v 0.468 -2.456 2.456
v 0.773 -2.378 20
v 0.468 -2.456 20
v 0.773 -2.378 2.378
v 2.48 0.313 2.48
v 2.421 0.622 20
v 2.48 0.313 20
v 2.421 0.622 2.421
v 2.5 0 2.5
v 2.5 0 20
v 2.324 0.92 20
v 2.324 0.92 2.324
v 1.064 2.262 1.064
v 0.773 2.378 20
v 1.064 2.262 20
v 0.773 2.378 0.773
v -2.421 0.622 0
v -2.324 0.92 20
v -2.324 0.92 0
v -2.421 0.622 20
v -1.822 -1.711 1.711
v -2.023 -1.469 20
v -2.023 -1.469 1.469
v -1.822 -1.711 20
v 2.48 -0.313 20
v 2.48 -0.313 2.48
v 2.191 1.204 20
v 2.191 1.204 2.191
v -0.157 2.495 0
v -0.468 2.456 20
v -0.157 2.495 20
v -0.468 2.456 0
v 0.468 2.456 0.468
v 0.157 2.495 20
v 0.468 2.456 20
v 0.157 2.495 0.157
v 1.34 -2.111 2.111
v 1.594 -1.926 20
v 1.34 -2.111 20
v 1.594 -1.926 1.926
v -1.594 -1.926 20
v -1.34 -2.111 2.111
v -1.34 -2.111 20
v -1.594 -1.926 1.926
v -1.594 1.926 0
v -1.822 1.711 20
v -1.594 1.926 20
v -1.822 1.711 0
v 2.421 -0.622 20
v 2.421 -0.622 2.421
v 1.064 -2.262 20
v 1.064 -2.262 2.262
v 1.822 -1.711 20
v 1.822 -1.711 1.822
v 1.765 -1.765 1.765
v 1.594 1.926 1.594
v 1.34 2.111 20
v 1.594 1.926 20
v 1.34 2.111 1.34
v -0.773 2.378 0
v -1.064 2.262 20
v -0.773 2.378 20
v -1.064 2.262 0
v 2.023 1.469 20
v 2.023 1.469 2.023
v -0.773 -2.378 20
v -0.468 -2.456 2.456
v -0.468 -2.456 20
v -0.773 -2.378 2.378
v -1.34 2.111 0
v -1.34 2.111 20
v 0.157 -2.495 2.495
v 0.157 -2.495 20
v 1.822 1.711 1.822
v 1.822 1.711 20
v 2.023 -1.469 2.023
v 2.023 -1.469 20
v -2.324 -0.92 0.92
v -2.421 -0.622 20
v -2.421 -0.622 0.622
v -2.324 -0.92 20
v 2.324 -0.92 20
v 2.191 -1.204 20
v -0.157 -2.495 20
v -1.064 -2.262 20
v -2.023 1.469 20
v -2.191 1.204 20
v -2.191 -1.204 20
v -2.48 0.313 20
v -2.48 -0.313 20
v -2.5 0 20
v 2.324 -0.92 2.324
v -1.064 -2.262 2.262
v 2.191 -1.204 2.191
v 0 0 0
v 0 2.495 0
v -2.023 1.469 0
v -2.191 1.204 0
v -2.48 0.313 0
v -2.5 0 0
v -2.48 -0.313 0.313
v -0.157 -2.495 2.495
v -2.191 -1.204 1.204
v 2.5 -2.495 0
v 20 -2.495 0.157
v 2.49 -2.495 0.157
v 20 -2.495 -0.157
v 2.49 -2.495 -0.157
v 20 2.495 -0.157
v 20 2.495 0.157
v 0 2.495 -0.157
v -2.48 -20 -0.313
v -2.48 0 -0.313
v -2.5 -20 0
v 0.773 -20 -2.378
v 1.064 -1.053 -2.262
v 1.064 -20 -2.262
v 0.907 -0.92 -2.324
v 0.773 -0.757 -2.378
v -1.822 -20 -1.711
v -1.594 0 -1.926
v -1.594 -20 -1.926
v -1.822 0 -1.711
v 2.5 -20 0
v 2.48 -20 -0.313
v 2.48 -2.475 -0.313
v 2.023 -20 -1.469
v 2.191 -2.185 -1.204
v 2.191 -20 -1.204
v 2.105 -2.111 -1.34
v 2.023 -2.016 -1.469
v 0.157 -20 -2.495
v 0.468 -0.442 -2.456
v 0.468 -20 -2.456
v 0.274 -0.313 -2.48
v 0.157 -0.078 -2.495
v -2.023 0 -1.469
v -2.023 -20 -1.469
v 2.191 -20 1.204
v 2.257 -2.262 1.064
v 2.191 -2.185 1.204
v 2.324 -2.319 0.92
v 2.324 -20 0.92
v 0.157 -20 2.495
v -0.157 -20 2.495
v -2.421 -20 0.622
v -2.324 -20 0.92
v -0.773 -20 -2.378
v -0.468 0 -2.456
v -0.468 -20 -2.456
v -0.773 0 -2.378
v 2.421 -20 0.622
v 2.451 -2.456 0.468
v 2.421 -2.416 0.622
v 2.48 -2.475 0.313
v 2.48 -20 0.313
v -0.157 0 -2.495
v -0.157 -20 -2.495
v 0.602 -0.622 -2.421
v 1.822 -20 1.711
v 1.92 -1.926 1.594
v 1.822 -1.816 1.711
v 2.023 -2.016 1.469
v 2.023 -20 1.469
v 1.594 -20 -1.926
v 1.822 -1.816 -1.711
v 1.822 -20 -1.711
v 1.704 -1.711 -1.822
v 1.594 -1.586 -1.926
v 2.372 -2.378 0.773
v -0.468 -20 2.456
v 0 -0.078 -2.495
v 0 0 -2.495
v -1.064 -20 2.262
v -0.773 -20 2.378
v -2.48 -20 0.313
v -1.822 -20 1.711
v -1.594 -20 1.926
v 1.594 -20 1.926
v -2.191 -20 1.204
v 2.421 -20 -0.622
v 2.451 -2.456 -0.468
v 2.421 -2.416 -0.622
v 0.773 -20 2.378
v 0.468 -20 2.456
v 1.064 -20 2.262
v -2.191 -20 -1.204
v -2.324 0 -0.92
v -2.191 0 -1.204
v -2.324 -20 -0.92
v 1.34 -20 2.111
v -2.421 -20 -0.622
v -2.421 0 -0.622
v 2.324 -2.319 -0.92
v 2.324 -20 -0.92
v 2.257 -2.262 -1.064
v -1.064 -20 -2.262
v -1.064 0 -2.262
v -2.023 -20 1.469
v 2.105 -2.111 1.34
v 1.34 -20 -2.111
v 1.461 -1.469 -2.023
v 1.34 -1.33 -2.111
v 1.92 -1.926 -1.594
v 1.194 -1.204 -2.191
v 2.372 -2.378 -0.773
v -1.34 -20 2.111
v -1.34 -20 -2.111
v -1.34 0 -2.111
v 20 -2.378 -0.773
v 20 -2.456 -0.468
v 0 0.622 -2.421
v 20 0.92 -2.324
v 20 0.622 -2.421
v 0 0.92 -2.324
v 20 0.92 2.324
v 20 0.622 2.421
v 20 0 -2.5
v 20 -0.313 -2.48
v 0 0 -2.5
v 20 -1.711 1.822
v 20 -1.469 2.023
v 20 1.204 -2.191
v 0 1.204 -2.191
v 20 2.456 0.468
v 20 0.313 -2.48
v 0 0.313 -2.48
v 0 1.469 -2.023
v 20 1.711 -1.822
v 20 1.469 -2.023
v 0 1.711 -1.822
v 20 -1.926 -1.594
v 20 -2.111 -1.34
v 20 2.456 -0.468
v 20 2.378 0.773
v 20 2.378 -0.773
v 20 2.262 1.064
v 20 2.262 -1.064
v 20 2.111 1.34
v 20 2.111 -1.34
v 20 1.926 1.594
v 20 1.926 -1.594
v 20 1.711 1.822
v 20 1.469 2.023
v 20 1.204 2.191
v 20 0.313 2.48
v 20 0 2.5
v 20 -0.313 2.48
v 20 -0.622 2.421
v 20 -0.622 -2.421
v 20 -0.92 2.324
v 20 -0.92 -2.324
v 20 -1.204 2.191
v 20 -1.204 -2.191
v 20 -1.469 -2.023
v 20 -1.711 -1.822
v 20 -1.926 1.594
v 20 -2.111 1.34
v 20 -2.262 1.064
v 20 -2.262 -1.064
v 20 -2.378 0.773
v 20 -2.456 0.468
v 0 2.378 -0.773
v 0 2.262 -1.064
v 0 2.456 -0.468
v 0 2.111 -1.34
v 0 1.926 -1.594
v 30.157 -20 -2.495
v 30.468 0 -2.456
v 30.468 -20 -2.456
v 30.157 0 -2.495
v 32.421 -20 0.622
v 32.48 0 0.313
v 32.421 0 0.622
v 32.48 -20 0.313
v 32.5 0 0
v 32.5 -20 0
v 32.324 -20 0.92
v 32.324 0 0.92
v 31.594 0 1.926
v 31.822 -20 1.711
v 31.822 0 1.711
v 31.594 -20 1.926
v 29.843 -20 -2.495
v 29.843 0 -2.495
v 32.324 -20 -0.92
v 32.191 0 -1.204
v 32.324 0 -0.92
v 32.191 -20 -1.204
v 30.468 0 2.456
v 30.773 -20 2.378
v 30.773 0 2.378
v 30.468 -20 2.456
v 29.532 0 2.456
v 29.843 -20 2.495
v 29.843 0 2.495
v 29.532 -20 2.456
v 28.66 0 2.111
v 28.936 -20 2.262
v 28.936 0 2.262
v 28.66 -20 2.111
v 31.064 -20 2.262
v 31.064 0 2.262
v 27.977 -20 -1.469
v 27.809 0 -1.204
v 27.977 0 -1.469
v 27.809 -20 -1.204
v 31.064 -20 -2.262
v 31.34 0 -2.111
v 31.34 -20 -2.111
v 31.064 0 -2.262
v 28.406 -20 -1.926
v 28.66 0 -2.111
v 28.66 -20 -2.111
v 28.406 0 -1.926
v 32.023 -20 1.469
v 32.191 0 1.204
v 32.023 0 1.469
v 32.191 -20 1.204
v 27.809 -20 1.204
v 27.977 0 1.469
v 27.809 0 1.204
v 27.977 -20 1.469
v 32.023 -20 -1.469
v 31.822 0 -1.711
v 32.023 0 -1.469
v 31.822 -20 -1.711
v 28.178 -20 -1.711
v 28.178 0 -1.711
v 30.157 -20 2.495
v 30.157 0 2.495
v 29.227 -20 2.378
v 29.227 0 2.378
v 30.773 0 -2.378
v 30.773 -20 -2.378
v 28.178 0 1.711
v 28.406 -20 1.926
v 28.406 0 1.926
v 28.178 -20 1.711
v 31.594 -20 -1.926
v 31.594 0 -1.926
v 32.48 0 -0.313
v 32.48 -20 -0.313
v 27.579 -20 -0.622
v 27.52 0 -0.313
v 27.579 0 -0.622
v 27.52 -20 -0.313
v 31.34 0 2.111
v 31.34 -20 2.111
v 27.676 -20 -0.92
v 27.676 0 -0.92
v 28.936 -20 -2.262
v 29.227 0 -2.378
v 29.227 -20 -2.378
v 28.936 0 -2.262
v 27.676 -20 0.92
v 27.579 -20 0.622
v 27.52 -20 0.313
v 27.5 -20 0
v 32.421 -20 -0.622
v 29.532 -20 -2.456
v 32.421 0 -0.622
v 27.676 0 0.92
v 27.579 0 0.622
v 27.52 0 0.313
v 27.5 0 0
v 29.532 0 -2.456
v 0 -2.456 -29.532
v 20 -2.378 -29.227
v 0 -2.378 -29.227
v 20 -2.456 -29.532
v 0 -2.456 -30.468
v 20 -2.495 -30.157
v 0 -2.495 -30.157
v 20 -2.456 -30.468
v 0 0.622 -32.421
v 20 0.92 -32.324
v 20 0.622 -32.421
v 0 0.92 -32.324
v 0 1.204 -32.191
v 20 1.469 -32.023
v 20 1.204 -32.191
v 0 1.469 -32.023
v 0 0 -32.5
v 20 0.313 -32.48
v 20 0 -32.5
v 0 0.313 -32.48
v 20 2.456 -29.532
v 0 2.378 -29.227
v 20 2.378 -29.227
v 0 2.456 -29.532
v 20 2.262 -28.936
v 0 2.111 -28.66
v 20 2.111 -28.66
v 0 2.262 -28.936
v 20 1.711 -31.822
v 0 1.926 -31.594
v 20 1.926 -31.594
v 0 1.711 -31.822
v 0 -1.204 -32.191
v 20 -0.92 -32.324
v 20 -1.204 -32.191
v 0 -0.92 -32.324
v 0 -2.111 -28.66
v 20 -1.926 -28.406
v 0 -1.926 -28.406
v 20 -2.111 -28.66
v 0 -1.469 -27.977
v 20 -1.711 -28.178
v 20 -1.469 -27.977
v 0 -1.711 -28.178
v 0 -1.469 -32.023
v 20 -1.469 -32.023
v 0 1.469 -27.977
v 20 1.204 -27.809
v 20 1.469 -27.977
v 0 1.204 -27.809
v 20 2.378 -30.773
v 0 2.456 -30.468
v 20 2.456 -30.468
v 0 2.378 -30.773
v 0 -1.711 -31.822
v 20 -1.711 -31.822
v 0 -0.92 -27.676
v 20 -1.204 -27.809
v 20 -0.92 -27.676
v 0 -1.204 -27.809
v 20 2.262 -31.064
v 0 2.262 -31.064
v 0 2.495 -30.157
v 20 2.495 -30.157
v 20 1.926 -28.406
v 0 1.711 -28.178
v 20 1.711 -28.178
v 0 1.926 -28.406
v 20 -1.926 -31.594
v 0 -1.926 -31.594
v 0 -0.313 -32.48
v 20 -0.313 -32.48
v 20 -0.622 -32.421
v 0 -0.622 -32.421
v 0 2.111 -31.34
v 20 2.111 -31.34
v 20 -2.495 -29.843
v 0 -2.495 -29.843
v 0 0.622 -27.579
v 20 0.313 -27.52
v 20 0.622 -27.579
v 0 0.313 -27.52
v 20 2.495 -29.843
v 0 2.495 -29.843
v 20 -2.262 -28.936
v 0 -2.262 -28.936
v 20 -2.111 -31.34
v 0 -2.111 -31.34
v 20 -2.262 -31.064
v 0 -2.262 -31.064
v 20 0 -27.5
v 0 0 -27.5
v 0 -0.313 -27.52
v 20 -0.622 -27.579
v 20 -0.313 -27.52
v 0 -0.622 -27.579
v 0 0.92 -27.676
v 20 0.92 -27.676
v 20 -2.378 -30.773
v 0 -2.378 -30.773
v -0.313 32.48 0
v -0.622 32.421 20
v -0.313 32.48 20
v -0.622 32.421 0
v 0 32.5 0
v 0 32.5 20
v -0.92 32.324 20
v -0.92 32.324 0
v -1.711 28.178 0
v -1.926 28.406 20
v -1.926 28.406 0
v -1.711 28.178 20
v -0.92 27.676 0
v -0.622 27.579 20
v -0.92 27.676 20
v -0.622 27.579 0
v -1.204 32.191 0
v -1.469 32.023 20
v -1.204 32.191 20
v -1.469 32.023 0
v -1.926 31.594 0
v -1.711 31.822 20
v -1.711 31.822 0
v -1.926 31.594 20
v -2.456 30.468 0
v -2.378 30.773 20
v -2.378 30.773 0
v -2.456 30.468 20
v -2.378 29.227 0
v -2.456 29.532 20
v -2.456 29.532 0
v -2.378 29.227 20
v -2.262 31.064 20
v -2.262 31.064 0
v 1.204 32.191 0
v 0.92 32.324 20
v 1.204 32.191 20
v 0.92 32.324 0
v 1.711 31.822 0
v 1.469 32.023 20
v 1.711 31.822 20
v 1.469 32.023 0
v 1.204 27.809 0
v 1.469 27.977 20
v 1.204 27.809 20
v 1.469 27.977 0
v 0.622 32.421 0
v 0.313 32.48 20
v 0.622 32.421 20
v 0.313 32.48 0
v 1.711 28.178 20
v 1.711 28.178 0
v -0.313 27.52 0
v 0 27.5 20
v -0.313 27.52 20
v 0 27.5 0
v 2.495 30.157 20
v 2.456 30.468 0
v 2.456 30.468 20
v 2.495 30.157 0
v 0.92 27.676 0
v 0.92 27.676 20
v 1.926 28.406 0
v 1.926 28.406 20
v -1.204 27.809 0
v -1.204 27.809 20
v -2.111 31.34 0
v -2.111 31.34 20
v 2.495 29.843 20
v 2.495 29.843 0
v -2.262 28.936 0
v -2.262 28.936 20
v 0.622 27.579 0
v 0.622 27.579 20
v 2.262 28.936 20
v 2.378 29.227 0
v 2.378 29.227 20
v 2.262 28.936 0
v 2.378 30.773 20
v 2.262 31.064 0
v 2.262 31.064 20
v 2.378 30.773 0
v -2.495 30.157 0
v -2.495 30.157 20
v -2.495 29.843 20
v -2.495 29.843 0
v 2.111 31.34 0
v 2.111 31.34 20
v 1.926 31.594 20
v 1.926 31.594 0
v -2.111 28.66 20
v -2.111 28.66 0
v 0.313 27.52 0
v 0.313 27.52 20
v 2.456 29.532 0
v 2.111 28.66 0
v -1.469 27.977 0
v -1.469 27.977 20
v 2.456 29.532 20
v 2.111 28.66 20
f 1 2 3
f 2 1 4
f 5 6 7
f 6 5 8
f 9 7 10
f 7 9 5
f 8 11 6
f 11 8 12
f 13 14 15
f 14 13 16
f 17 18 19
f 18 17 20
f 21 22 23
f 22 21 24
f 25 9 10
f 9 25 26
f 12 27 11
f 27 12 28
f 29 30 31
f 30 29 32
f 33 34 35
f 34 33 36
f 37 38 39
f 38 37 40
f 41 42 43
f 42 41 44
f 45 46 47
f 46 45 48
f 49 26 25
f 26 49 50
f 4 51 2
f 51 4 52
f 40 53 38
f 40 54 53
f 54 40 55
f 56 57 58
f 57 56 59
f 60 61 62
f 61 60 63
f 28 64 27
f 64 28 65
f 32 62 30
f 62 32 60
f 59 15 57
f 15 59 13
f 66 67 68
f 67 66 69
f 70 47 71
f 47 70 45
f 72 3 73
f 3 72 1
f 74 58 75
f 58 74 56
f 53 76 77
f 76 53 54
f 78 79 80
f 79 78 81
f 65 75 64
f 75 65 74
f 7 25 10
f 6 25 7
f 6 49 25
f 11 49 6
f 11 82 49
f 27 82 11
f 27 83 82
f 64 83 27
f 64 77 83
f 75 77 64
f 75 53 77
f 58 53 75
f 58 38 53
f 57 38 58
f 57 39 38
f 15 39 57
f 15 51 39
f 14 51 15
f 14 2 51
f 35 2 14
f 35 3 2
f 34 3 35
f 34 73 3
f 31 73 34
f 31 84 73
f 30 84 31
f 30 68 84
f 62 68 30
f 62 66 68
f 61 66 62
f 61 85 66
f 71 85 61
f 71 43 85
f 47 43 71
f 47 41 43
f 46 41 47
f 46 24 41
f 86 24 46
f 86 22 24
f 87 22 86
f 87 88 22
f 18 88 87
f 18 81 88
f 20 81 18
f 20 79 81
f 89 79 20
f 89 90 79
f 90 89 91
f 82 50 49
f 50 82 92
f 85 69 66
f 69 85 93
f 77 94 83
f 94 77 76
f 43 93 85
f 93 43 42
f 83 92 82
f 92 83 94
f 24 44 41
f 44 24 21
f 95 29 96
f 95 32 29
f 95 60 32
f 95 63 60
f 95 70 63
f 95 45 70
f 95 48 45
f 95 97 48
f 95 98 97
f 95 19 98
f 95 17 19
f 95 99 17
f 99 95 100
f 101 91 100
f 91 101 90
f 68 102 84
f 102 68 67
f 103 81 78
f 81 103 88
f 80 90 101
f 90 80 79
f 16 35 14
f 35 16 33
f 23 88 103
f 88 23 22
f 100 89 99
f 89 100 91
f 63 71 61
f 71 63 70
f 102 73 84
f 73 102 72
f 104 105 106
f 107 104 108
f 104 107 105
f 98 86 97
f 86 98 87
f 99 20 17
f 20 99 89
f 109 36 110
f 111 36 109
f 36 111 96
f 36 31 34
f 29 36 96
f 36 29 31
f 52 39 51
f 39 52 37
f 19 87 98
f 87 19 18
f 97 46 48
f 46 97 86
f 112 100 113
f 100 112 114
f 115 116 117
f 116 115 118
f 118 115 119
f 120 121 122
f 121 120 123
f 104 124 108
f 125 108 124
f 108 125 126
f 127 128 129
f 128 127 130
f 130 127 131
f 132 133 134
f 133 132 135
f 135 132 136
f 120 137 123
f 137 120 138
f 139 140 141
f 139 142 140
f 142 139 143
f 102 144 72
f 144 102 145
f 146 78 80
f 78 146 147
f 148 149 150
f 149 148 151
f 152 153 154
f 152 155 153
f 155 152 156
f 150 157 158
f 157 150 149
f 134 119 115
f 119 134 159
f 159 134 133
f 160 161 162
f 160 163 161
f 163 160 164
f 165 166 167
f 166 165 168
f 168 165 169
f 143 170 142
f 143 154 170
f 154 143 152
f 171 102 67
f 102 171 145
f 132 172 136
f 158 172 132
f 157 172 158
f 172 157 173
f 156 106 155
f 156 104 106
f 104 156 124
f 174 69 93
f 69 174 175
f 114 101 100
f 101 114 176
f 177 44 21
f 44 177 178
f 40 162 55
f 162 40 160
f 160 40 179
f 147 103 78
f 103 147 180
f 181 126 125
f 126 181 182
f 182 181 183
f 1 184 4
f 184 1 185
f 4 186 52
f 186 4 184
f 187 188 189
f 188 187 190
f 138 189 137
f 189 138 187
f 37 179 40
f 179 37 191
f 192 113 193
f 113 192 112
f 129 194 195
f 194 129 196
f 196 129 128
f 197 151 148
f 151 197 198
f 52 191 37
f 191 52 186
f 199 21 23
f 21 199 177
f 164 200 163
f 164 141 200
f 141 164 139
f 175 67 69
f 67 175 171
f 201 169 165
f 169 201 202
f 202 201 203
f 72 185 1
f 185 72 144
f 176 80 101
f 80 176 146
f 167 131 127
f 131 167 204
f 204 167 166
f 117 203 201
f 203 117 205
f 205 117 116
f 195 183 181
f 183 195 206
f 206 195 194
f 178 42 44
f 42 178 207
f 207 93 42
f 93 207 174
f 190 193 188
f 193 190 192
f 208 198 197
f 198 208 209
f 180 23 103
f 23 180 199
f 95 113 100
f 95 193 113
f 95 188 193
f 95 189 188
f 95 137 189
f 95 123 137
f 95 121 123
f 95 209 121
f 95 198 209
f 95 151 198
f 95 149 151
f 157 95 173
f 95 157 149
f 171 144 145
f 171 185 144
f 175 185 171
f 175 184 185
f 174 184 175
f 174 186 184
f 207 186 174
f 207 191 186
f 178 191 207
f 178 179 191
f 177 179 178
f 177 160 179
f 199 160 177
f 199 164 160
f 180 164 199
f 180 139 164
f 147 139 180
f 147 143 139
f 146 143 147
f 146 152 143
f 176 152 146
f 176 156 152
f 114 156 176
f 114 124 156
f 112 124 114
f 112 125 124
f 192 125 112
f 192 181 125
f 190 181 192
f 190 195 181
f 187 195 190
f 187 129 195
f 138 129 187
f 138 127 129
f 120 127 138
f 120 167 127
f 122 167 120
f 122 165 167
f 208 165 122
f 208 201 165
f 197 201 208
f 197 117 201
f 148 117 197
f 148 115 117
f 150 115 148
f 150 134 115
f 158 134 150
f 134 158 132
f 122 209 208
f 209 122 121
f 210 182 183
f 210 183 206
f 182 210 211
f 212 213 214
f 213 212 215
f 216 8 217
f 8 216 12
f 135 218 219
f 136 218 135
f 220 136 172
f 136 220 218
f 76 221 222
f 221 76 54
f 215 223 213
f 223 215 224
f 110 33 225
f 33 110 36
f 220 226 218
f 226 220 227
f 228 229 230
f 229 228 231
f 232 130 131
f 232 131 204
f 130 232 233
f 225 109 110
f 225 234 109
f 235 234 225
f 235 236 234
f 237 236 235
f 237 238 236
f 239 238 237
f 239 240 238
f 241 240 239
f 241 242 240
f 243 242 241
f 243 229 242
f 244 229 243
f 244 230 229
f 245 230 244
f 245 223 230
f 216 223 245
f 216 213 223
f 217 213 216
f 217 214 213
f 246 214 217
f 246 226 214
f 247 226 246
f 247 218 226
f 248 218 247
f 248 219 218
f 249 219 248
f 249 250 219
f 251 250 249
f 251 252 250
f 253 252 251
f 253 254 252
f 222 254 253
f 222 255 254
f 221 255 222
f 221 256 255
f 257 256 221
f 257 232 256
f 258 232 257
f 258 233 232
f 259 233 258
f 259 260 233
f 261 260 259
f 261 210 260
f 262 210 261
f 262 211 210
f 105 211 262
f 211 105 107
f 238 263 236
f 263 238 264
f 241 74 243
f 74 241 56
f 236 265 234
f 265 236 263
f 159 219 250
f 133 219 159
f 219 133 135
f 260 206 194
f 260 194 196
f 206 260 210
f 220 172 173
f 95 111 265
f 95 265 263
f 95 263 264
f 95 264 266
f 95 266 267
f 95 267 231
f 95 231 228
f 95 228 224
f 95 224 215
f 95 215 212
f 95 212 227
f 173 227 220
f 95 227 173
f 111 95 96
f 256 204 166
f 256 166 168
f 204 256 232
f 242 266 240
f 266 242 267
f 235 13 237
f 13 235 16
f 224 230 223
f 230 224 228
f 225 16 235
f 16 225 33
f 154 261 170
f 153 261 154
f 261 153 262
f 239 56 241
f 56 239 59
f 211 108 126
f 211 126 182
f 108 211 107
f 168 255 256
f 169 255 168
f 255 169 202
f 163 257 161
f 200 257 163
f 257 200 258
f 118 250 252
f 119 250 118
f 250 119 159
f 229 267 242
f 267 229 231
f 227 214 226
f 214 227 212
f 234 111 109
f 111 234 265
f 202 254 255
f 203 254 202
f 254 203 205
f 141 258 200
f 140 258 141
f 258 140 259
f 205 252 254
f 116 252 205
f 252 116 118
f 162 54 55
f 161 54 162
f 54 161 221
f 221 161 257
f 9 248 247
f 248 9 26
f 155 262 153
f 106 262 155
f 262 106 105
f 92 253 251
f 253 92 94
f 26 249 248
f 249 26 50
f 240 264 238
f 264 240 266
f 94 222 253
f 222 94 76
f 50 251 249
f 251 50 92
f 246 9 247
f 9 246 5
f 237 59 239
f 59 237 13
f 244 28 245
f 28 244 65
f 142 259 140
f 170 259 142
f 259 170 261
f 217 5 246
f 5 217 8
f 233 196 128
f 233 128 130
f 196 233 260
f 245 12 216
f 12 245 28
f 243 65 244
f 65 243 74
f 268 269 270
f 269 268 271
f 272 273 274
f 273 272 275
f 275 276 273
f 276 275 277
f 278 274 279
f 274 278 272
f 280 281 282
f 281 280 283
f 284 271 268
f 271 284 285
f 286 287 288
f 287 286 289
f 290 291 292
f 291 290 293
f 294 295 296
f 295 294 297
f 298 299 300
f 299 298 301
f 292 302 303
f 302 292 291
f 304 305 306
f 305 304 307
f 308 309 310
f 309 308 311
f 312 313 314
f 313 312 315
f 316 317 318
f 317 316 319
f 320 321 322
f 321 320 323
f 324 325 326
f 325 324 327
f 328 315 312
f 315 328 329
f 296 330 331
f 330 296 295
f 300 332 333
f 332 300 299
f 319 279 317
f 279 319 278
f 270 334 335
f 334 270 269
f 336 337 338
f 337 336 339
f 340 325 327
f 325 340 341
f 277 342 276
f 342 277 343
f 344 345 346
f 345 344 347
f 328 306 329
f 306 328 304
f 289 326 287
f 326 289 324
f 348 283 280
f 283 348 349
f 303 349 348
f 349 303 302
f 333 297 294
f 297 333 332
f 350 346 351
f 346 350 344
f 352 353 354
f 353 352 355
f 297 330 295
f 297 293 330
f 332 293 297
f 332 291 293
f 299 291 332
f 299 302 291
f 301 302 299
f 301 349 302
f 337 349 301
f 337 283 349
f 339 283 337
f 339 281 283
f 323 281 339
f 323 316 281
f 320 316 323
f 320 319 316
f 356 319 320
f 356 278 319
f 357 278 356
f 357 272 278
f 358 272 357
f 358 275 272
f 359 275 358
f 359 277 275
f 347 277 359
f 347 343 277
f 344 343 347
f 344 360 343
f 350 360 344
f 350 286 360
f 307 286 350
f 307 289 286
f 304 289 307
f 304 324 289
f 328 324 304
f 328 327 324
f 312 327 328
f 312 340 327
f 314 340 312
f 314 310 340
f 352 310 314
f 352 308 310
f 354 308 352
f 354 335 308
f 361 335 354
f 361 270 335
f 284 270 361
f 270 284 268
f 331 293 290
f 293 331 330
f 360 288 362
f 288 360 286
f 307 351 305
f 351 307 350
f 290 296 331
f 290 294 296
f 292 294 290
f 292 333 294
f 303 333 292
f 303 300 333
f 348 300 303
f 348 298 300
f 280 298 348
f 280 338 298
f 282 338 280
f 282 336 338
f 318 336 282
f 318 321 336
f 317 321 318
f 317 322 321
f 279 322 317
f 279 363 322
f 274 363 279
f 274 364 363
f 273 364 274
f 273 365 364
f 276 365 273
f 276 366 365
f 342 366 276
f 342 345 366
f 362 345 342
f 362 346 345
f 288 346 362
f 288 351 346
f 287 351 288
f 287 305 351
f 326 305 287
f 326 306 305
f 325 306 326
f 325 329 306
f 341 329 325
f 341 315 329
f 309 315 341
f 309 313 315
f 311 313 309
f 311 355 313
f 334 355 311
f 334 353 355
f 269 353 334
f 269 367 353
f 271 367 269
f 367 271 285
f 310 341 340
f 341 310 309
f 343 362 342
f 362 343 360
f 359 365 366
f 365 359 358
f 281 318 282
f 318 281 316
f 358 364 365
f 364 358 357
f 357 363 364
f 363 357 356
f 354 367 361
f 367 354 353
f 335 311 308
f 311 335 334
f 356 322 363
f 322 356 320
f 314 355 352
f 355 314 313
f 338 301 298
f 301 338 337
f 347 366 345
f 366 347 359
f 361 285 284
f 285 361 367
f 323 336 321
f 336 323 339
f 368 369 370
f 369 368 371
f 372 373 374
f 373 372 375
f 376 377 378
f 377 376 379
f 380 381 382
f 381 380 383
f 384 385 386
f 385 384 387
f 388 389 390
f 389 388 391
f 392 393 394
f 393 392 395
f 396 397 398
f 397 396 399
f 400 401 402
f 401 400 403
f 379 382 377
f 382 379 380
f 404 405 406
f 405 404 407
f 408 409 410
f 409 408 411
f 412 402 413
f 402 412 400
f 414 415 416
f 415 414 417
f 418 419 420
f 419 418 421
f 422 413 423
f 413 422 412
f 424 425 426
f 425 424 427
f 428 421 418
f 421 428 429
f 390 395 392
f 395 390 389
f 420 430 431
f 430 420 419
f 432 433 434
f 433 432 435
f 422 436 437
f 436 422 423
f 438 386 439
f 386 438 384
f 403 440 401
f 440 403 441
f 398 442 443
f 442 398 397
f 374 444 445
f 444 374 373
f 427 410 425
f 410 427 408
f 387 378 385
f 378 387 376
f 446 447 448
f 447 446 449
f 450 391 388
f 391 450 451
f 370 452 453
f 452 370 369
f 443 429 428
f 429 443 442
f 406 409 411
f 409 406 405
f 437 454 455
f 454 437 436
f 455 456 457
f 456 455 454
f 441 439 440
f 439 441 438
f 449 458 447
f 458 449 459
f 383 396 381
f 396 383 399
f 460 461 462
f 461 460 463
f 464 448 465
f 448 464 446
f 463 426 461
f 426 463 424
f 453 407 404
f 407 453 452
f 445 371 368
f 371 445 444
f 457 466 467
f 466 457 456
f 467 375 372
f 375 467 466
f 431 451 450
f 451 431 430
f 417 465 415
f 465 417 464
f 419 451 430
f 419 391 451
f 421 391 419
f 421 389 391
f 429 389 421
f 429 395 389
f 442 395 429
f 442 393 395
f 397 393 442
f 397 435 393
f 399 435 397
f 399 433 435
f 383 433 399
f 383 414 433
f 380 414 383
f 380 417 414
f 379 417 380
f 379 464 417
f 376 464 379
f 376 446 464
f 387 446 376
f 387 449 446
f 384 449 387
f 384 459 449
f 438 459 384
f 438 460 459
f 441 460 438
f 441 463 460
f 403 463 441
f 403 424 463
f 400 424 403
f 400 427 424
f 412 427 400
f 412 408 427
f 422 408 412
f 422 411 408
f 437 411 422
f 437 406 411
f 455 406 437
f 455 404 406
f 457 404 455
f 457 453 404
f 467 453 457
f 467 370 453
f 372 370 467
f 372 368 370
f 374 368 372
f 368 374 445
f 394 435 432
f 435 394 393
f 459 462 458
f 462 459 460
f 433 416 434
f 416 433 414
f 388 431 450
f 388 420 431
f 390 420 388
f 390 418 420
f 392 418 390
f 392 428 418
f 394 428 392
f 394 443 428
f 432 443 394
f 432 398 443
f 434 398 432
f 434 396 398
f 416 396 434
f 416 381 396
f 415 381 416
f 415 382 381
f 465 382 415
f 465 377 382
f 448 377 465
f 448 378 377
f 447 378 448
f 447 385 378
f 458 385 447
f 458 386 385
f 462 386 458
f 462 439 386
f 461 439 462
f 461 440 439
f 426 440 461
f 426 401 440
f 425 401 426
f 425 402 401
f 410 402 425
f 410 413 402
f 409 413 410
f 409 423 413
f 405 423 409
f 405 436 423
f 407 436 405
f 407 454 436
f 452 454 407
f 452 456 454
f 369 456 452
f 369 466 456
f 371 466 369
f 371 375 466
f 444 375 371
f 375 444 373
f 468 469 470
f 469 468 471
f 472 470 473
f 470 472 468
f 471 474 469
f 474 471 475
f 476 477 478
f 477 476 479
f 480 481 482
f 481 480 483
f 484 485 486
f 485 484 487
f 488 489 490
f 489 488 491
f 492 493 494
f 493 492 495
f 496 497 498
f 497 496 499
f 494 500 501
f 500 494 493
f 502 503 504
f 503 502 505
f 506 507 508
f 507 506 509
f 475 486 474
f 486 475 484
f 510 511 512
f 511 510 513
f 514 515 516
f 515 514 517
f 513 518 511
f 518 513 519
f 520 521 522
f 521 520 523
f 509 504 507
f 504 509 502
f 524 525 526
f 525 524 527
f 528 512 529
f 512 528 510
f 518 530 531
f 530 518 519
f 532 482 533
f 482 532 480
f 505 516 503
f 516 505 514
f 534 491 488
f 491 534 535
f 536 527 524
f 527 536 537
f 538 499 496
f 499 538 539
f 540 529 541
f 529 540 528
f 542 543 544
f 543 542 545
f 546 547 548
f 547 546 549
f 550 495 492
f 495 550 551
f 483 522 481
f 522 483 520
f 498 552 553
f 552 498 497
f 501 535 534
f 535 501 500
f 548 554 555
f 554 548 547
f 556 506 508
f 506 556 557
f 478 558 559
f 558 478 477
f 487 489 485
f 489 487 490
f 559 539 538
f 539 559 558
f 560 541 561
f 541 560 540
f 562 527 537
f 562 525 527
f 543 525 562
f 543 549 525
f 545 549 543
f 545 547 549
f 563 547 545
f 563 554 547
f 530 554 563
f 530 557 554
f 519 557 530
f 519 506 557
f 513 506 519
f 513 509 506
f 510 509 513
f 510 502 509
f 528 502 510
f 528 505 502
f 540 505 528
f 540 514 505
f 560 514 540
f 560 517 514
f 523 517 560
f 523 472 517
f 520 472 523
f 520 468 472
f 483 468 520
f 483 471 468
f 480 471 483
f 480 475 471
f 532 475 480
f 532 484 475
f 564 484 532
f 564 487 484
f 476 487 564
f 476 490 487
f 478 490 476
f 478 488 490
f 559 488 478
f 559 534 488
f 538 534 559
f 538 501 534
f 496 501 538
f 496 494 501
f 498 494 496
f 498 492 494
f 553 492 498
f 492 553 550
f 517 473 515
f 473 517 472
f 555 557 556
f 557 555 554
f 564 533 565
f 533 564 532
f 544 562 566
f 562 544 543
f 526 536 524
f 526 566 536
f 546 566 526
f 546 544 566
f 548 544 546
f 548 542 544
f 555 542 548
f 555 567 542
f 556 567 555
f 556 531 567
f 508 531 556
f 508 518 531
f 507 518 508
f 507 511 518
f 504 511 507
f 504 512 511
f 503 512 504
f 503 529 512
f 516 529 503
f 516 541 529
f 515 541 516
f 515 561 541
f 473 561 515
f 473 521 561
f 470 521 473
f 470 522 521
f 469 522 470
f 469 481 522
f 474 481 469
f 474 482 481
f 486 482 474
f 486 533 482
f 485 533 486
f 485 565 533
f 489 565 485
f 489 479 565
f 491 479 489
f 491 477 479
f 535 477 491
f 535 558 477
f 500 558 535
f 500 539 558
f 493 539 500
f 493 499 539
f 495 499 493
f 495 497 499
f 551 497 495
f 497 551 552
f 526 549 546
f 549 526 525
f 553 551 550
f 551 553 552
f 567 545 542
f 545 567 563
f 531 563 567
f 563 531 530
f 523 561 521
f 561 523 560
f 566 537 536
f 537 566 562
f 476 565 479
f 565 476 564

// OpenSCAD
$fn=50;
module C() { cylinder(20,d=5); }


// typically, always translate and then rotate

C();
#rotate([90,0,0]) C();
#rotate([0,90,0]) C();
//  this is the same as C(), since cylinder is already around the Z axis.
//rotate([0,0,90]) C();


// if you translate and then rotate
C();
#rotate([90,0,0]) translate([30,0,0]) C();
#rotate([0,90,0])  translate([30,0,0]) C();
//  this is the same as C(), since cylinder is already around the Z axis.
rotate([0,0,90])  translate([30,0,0]) C();
